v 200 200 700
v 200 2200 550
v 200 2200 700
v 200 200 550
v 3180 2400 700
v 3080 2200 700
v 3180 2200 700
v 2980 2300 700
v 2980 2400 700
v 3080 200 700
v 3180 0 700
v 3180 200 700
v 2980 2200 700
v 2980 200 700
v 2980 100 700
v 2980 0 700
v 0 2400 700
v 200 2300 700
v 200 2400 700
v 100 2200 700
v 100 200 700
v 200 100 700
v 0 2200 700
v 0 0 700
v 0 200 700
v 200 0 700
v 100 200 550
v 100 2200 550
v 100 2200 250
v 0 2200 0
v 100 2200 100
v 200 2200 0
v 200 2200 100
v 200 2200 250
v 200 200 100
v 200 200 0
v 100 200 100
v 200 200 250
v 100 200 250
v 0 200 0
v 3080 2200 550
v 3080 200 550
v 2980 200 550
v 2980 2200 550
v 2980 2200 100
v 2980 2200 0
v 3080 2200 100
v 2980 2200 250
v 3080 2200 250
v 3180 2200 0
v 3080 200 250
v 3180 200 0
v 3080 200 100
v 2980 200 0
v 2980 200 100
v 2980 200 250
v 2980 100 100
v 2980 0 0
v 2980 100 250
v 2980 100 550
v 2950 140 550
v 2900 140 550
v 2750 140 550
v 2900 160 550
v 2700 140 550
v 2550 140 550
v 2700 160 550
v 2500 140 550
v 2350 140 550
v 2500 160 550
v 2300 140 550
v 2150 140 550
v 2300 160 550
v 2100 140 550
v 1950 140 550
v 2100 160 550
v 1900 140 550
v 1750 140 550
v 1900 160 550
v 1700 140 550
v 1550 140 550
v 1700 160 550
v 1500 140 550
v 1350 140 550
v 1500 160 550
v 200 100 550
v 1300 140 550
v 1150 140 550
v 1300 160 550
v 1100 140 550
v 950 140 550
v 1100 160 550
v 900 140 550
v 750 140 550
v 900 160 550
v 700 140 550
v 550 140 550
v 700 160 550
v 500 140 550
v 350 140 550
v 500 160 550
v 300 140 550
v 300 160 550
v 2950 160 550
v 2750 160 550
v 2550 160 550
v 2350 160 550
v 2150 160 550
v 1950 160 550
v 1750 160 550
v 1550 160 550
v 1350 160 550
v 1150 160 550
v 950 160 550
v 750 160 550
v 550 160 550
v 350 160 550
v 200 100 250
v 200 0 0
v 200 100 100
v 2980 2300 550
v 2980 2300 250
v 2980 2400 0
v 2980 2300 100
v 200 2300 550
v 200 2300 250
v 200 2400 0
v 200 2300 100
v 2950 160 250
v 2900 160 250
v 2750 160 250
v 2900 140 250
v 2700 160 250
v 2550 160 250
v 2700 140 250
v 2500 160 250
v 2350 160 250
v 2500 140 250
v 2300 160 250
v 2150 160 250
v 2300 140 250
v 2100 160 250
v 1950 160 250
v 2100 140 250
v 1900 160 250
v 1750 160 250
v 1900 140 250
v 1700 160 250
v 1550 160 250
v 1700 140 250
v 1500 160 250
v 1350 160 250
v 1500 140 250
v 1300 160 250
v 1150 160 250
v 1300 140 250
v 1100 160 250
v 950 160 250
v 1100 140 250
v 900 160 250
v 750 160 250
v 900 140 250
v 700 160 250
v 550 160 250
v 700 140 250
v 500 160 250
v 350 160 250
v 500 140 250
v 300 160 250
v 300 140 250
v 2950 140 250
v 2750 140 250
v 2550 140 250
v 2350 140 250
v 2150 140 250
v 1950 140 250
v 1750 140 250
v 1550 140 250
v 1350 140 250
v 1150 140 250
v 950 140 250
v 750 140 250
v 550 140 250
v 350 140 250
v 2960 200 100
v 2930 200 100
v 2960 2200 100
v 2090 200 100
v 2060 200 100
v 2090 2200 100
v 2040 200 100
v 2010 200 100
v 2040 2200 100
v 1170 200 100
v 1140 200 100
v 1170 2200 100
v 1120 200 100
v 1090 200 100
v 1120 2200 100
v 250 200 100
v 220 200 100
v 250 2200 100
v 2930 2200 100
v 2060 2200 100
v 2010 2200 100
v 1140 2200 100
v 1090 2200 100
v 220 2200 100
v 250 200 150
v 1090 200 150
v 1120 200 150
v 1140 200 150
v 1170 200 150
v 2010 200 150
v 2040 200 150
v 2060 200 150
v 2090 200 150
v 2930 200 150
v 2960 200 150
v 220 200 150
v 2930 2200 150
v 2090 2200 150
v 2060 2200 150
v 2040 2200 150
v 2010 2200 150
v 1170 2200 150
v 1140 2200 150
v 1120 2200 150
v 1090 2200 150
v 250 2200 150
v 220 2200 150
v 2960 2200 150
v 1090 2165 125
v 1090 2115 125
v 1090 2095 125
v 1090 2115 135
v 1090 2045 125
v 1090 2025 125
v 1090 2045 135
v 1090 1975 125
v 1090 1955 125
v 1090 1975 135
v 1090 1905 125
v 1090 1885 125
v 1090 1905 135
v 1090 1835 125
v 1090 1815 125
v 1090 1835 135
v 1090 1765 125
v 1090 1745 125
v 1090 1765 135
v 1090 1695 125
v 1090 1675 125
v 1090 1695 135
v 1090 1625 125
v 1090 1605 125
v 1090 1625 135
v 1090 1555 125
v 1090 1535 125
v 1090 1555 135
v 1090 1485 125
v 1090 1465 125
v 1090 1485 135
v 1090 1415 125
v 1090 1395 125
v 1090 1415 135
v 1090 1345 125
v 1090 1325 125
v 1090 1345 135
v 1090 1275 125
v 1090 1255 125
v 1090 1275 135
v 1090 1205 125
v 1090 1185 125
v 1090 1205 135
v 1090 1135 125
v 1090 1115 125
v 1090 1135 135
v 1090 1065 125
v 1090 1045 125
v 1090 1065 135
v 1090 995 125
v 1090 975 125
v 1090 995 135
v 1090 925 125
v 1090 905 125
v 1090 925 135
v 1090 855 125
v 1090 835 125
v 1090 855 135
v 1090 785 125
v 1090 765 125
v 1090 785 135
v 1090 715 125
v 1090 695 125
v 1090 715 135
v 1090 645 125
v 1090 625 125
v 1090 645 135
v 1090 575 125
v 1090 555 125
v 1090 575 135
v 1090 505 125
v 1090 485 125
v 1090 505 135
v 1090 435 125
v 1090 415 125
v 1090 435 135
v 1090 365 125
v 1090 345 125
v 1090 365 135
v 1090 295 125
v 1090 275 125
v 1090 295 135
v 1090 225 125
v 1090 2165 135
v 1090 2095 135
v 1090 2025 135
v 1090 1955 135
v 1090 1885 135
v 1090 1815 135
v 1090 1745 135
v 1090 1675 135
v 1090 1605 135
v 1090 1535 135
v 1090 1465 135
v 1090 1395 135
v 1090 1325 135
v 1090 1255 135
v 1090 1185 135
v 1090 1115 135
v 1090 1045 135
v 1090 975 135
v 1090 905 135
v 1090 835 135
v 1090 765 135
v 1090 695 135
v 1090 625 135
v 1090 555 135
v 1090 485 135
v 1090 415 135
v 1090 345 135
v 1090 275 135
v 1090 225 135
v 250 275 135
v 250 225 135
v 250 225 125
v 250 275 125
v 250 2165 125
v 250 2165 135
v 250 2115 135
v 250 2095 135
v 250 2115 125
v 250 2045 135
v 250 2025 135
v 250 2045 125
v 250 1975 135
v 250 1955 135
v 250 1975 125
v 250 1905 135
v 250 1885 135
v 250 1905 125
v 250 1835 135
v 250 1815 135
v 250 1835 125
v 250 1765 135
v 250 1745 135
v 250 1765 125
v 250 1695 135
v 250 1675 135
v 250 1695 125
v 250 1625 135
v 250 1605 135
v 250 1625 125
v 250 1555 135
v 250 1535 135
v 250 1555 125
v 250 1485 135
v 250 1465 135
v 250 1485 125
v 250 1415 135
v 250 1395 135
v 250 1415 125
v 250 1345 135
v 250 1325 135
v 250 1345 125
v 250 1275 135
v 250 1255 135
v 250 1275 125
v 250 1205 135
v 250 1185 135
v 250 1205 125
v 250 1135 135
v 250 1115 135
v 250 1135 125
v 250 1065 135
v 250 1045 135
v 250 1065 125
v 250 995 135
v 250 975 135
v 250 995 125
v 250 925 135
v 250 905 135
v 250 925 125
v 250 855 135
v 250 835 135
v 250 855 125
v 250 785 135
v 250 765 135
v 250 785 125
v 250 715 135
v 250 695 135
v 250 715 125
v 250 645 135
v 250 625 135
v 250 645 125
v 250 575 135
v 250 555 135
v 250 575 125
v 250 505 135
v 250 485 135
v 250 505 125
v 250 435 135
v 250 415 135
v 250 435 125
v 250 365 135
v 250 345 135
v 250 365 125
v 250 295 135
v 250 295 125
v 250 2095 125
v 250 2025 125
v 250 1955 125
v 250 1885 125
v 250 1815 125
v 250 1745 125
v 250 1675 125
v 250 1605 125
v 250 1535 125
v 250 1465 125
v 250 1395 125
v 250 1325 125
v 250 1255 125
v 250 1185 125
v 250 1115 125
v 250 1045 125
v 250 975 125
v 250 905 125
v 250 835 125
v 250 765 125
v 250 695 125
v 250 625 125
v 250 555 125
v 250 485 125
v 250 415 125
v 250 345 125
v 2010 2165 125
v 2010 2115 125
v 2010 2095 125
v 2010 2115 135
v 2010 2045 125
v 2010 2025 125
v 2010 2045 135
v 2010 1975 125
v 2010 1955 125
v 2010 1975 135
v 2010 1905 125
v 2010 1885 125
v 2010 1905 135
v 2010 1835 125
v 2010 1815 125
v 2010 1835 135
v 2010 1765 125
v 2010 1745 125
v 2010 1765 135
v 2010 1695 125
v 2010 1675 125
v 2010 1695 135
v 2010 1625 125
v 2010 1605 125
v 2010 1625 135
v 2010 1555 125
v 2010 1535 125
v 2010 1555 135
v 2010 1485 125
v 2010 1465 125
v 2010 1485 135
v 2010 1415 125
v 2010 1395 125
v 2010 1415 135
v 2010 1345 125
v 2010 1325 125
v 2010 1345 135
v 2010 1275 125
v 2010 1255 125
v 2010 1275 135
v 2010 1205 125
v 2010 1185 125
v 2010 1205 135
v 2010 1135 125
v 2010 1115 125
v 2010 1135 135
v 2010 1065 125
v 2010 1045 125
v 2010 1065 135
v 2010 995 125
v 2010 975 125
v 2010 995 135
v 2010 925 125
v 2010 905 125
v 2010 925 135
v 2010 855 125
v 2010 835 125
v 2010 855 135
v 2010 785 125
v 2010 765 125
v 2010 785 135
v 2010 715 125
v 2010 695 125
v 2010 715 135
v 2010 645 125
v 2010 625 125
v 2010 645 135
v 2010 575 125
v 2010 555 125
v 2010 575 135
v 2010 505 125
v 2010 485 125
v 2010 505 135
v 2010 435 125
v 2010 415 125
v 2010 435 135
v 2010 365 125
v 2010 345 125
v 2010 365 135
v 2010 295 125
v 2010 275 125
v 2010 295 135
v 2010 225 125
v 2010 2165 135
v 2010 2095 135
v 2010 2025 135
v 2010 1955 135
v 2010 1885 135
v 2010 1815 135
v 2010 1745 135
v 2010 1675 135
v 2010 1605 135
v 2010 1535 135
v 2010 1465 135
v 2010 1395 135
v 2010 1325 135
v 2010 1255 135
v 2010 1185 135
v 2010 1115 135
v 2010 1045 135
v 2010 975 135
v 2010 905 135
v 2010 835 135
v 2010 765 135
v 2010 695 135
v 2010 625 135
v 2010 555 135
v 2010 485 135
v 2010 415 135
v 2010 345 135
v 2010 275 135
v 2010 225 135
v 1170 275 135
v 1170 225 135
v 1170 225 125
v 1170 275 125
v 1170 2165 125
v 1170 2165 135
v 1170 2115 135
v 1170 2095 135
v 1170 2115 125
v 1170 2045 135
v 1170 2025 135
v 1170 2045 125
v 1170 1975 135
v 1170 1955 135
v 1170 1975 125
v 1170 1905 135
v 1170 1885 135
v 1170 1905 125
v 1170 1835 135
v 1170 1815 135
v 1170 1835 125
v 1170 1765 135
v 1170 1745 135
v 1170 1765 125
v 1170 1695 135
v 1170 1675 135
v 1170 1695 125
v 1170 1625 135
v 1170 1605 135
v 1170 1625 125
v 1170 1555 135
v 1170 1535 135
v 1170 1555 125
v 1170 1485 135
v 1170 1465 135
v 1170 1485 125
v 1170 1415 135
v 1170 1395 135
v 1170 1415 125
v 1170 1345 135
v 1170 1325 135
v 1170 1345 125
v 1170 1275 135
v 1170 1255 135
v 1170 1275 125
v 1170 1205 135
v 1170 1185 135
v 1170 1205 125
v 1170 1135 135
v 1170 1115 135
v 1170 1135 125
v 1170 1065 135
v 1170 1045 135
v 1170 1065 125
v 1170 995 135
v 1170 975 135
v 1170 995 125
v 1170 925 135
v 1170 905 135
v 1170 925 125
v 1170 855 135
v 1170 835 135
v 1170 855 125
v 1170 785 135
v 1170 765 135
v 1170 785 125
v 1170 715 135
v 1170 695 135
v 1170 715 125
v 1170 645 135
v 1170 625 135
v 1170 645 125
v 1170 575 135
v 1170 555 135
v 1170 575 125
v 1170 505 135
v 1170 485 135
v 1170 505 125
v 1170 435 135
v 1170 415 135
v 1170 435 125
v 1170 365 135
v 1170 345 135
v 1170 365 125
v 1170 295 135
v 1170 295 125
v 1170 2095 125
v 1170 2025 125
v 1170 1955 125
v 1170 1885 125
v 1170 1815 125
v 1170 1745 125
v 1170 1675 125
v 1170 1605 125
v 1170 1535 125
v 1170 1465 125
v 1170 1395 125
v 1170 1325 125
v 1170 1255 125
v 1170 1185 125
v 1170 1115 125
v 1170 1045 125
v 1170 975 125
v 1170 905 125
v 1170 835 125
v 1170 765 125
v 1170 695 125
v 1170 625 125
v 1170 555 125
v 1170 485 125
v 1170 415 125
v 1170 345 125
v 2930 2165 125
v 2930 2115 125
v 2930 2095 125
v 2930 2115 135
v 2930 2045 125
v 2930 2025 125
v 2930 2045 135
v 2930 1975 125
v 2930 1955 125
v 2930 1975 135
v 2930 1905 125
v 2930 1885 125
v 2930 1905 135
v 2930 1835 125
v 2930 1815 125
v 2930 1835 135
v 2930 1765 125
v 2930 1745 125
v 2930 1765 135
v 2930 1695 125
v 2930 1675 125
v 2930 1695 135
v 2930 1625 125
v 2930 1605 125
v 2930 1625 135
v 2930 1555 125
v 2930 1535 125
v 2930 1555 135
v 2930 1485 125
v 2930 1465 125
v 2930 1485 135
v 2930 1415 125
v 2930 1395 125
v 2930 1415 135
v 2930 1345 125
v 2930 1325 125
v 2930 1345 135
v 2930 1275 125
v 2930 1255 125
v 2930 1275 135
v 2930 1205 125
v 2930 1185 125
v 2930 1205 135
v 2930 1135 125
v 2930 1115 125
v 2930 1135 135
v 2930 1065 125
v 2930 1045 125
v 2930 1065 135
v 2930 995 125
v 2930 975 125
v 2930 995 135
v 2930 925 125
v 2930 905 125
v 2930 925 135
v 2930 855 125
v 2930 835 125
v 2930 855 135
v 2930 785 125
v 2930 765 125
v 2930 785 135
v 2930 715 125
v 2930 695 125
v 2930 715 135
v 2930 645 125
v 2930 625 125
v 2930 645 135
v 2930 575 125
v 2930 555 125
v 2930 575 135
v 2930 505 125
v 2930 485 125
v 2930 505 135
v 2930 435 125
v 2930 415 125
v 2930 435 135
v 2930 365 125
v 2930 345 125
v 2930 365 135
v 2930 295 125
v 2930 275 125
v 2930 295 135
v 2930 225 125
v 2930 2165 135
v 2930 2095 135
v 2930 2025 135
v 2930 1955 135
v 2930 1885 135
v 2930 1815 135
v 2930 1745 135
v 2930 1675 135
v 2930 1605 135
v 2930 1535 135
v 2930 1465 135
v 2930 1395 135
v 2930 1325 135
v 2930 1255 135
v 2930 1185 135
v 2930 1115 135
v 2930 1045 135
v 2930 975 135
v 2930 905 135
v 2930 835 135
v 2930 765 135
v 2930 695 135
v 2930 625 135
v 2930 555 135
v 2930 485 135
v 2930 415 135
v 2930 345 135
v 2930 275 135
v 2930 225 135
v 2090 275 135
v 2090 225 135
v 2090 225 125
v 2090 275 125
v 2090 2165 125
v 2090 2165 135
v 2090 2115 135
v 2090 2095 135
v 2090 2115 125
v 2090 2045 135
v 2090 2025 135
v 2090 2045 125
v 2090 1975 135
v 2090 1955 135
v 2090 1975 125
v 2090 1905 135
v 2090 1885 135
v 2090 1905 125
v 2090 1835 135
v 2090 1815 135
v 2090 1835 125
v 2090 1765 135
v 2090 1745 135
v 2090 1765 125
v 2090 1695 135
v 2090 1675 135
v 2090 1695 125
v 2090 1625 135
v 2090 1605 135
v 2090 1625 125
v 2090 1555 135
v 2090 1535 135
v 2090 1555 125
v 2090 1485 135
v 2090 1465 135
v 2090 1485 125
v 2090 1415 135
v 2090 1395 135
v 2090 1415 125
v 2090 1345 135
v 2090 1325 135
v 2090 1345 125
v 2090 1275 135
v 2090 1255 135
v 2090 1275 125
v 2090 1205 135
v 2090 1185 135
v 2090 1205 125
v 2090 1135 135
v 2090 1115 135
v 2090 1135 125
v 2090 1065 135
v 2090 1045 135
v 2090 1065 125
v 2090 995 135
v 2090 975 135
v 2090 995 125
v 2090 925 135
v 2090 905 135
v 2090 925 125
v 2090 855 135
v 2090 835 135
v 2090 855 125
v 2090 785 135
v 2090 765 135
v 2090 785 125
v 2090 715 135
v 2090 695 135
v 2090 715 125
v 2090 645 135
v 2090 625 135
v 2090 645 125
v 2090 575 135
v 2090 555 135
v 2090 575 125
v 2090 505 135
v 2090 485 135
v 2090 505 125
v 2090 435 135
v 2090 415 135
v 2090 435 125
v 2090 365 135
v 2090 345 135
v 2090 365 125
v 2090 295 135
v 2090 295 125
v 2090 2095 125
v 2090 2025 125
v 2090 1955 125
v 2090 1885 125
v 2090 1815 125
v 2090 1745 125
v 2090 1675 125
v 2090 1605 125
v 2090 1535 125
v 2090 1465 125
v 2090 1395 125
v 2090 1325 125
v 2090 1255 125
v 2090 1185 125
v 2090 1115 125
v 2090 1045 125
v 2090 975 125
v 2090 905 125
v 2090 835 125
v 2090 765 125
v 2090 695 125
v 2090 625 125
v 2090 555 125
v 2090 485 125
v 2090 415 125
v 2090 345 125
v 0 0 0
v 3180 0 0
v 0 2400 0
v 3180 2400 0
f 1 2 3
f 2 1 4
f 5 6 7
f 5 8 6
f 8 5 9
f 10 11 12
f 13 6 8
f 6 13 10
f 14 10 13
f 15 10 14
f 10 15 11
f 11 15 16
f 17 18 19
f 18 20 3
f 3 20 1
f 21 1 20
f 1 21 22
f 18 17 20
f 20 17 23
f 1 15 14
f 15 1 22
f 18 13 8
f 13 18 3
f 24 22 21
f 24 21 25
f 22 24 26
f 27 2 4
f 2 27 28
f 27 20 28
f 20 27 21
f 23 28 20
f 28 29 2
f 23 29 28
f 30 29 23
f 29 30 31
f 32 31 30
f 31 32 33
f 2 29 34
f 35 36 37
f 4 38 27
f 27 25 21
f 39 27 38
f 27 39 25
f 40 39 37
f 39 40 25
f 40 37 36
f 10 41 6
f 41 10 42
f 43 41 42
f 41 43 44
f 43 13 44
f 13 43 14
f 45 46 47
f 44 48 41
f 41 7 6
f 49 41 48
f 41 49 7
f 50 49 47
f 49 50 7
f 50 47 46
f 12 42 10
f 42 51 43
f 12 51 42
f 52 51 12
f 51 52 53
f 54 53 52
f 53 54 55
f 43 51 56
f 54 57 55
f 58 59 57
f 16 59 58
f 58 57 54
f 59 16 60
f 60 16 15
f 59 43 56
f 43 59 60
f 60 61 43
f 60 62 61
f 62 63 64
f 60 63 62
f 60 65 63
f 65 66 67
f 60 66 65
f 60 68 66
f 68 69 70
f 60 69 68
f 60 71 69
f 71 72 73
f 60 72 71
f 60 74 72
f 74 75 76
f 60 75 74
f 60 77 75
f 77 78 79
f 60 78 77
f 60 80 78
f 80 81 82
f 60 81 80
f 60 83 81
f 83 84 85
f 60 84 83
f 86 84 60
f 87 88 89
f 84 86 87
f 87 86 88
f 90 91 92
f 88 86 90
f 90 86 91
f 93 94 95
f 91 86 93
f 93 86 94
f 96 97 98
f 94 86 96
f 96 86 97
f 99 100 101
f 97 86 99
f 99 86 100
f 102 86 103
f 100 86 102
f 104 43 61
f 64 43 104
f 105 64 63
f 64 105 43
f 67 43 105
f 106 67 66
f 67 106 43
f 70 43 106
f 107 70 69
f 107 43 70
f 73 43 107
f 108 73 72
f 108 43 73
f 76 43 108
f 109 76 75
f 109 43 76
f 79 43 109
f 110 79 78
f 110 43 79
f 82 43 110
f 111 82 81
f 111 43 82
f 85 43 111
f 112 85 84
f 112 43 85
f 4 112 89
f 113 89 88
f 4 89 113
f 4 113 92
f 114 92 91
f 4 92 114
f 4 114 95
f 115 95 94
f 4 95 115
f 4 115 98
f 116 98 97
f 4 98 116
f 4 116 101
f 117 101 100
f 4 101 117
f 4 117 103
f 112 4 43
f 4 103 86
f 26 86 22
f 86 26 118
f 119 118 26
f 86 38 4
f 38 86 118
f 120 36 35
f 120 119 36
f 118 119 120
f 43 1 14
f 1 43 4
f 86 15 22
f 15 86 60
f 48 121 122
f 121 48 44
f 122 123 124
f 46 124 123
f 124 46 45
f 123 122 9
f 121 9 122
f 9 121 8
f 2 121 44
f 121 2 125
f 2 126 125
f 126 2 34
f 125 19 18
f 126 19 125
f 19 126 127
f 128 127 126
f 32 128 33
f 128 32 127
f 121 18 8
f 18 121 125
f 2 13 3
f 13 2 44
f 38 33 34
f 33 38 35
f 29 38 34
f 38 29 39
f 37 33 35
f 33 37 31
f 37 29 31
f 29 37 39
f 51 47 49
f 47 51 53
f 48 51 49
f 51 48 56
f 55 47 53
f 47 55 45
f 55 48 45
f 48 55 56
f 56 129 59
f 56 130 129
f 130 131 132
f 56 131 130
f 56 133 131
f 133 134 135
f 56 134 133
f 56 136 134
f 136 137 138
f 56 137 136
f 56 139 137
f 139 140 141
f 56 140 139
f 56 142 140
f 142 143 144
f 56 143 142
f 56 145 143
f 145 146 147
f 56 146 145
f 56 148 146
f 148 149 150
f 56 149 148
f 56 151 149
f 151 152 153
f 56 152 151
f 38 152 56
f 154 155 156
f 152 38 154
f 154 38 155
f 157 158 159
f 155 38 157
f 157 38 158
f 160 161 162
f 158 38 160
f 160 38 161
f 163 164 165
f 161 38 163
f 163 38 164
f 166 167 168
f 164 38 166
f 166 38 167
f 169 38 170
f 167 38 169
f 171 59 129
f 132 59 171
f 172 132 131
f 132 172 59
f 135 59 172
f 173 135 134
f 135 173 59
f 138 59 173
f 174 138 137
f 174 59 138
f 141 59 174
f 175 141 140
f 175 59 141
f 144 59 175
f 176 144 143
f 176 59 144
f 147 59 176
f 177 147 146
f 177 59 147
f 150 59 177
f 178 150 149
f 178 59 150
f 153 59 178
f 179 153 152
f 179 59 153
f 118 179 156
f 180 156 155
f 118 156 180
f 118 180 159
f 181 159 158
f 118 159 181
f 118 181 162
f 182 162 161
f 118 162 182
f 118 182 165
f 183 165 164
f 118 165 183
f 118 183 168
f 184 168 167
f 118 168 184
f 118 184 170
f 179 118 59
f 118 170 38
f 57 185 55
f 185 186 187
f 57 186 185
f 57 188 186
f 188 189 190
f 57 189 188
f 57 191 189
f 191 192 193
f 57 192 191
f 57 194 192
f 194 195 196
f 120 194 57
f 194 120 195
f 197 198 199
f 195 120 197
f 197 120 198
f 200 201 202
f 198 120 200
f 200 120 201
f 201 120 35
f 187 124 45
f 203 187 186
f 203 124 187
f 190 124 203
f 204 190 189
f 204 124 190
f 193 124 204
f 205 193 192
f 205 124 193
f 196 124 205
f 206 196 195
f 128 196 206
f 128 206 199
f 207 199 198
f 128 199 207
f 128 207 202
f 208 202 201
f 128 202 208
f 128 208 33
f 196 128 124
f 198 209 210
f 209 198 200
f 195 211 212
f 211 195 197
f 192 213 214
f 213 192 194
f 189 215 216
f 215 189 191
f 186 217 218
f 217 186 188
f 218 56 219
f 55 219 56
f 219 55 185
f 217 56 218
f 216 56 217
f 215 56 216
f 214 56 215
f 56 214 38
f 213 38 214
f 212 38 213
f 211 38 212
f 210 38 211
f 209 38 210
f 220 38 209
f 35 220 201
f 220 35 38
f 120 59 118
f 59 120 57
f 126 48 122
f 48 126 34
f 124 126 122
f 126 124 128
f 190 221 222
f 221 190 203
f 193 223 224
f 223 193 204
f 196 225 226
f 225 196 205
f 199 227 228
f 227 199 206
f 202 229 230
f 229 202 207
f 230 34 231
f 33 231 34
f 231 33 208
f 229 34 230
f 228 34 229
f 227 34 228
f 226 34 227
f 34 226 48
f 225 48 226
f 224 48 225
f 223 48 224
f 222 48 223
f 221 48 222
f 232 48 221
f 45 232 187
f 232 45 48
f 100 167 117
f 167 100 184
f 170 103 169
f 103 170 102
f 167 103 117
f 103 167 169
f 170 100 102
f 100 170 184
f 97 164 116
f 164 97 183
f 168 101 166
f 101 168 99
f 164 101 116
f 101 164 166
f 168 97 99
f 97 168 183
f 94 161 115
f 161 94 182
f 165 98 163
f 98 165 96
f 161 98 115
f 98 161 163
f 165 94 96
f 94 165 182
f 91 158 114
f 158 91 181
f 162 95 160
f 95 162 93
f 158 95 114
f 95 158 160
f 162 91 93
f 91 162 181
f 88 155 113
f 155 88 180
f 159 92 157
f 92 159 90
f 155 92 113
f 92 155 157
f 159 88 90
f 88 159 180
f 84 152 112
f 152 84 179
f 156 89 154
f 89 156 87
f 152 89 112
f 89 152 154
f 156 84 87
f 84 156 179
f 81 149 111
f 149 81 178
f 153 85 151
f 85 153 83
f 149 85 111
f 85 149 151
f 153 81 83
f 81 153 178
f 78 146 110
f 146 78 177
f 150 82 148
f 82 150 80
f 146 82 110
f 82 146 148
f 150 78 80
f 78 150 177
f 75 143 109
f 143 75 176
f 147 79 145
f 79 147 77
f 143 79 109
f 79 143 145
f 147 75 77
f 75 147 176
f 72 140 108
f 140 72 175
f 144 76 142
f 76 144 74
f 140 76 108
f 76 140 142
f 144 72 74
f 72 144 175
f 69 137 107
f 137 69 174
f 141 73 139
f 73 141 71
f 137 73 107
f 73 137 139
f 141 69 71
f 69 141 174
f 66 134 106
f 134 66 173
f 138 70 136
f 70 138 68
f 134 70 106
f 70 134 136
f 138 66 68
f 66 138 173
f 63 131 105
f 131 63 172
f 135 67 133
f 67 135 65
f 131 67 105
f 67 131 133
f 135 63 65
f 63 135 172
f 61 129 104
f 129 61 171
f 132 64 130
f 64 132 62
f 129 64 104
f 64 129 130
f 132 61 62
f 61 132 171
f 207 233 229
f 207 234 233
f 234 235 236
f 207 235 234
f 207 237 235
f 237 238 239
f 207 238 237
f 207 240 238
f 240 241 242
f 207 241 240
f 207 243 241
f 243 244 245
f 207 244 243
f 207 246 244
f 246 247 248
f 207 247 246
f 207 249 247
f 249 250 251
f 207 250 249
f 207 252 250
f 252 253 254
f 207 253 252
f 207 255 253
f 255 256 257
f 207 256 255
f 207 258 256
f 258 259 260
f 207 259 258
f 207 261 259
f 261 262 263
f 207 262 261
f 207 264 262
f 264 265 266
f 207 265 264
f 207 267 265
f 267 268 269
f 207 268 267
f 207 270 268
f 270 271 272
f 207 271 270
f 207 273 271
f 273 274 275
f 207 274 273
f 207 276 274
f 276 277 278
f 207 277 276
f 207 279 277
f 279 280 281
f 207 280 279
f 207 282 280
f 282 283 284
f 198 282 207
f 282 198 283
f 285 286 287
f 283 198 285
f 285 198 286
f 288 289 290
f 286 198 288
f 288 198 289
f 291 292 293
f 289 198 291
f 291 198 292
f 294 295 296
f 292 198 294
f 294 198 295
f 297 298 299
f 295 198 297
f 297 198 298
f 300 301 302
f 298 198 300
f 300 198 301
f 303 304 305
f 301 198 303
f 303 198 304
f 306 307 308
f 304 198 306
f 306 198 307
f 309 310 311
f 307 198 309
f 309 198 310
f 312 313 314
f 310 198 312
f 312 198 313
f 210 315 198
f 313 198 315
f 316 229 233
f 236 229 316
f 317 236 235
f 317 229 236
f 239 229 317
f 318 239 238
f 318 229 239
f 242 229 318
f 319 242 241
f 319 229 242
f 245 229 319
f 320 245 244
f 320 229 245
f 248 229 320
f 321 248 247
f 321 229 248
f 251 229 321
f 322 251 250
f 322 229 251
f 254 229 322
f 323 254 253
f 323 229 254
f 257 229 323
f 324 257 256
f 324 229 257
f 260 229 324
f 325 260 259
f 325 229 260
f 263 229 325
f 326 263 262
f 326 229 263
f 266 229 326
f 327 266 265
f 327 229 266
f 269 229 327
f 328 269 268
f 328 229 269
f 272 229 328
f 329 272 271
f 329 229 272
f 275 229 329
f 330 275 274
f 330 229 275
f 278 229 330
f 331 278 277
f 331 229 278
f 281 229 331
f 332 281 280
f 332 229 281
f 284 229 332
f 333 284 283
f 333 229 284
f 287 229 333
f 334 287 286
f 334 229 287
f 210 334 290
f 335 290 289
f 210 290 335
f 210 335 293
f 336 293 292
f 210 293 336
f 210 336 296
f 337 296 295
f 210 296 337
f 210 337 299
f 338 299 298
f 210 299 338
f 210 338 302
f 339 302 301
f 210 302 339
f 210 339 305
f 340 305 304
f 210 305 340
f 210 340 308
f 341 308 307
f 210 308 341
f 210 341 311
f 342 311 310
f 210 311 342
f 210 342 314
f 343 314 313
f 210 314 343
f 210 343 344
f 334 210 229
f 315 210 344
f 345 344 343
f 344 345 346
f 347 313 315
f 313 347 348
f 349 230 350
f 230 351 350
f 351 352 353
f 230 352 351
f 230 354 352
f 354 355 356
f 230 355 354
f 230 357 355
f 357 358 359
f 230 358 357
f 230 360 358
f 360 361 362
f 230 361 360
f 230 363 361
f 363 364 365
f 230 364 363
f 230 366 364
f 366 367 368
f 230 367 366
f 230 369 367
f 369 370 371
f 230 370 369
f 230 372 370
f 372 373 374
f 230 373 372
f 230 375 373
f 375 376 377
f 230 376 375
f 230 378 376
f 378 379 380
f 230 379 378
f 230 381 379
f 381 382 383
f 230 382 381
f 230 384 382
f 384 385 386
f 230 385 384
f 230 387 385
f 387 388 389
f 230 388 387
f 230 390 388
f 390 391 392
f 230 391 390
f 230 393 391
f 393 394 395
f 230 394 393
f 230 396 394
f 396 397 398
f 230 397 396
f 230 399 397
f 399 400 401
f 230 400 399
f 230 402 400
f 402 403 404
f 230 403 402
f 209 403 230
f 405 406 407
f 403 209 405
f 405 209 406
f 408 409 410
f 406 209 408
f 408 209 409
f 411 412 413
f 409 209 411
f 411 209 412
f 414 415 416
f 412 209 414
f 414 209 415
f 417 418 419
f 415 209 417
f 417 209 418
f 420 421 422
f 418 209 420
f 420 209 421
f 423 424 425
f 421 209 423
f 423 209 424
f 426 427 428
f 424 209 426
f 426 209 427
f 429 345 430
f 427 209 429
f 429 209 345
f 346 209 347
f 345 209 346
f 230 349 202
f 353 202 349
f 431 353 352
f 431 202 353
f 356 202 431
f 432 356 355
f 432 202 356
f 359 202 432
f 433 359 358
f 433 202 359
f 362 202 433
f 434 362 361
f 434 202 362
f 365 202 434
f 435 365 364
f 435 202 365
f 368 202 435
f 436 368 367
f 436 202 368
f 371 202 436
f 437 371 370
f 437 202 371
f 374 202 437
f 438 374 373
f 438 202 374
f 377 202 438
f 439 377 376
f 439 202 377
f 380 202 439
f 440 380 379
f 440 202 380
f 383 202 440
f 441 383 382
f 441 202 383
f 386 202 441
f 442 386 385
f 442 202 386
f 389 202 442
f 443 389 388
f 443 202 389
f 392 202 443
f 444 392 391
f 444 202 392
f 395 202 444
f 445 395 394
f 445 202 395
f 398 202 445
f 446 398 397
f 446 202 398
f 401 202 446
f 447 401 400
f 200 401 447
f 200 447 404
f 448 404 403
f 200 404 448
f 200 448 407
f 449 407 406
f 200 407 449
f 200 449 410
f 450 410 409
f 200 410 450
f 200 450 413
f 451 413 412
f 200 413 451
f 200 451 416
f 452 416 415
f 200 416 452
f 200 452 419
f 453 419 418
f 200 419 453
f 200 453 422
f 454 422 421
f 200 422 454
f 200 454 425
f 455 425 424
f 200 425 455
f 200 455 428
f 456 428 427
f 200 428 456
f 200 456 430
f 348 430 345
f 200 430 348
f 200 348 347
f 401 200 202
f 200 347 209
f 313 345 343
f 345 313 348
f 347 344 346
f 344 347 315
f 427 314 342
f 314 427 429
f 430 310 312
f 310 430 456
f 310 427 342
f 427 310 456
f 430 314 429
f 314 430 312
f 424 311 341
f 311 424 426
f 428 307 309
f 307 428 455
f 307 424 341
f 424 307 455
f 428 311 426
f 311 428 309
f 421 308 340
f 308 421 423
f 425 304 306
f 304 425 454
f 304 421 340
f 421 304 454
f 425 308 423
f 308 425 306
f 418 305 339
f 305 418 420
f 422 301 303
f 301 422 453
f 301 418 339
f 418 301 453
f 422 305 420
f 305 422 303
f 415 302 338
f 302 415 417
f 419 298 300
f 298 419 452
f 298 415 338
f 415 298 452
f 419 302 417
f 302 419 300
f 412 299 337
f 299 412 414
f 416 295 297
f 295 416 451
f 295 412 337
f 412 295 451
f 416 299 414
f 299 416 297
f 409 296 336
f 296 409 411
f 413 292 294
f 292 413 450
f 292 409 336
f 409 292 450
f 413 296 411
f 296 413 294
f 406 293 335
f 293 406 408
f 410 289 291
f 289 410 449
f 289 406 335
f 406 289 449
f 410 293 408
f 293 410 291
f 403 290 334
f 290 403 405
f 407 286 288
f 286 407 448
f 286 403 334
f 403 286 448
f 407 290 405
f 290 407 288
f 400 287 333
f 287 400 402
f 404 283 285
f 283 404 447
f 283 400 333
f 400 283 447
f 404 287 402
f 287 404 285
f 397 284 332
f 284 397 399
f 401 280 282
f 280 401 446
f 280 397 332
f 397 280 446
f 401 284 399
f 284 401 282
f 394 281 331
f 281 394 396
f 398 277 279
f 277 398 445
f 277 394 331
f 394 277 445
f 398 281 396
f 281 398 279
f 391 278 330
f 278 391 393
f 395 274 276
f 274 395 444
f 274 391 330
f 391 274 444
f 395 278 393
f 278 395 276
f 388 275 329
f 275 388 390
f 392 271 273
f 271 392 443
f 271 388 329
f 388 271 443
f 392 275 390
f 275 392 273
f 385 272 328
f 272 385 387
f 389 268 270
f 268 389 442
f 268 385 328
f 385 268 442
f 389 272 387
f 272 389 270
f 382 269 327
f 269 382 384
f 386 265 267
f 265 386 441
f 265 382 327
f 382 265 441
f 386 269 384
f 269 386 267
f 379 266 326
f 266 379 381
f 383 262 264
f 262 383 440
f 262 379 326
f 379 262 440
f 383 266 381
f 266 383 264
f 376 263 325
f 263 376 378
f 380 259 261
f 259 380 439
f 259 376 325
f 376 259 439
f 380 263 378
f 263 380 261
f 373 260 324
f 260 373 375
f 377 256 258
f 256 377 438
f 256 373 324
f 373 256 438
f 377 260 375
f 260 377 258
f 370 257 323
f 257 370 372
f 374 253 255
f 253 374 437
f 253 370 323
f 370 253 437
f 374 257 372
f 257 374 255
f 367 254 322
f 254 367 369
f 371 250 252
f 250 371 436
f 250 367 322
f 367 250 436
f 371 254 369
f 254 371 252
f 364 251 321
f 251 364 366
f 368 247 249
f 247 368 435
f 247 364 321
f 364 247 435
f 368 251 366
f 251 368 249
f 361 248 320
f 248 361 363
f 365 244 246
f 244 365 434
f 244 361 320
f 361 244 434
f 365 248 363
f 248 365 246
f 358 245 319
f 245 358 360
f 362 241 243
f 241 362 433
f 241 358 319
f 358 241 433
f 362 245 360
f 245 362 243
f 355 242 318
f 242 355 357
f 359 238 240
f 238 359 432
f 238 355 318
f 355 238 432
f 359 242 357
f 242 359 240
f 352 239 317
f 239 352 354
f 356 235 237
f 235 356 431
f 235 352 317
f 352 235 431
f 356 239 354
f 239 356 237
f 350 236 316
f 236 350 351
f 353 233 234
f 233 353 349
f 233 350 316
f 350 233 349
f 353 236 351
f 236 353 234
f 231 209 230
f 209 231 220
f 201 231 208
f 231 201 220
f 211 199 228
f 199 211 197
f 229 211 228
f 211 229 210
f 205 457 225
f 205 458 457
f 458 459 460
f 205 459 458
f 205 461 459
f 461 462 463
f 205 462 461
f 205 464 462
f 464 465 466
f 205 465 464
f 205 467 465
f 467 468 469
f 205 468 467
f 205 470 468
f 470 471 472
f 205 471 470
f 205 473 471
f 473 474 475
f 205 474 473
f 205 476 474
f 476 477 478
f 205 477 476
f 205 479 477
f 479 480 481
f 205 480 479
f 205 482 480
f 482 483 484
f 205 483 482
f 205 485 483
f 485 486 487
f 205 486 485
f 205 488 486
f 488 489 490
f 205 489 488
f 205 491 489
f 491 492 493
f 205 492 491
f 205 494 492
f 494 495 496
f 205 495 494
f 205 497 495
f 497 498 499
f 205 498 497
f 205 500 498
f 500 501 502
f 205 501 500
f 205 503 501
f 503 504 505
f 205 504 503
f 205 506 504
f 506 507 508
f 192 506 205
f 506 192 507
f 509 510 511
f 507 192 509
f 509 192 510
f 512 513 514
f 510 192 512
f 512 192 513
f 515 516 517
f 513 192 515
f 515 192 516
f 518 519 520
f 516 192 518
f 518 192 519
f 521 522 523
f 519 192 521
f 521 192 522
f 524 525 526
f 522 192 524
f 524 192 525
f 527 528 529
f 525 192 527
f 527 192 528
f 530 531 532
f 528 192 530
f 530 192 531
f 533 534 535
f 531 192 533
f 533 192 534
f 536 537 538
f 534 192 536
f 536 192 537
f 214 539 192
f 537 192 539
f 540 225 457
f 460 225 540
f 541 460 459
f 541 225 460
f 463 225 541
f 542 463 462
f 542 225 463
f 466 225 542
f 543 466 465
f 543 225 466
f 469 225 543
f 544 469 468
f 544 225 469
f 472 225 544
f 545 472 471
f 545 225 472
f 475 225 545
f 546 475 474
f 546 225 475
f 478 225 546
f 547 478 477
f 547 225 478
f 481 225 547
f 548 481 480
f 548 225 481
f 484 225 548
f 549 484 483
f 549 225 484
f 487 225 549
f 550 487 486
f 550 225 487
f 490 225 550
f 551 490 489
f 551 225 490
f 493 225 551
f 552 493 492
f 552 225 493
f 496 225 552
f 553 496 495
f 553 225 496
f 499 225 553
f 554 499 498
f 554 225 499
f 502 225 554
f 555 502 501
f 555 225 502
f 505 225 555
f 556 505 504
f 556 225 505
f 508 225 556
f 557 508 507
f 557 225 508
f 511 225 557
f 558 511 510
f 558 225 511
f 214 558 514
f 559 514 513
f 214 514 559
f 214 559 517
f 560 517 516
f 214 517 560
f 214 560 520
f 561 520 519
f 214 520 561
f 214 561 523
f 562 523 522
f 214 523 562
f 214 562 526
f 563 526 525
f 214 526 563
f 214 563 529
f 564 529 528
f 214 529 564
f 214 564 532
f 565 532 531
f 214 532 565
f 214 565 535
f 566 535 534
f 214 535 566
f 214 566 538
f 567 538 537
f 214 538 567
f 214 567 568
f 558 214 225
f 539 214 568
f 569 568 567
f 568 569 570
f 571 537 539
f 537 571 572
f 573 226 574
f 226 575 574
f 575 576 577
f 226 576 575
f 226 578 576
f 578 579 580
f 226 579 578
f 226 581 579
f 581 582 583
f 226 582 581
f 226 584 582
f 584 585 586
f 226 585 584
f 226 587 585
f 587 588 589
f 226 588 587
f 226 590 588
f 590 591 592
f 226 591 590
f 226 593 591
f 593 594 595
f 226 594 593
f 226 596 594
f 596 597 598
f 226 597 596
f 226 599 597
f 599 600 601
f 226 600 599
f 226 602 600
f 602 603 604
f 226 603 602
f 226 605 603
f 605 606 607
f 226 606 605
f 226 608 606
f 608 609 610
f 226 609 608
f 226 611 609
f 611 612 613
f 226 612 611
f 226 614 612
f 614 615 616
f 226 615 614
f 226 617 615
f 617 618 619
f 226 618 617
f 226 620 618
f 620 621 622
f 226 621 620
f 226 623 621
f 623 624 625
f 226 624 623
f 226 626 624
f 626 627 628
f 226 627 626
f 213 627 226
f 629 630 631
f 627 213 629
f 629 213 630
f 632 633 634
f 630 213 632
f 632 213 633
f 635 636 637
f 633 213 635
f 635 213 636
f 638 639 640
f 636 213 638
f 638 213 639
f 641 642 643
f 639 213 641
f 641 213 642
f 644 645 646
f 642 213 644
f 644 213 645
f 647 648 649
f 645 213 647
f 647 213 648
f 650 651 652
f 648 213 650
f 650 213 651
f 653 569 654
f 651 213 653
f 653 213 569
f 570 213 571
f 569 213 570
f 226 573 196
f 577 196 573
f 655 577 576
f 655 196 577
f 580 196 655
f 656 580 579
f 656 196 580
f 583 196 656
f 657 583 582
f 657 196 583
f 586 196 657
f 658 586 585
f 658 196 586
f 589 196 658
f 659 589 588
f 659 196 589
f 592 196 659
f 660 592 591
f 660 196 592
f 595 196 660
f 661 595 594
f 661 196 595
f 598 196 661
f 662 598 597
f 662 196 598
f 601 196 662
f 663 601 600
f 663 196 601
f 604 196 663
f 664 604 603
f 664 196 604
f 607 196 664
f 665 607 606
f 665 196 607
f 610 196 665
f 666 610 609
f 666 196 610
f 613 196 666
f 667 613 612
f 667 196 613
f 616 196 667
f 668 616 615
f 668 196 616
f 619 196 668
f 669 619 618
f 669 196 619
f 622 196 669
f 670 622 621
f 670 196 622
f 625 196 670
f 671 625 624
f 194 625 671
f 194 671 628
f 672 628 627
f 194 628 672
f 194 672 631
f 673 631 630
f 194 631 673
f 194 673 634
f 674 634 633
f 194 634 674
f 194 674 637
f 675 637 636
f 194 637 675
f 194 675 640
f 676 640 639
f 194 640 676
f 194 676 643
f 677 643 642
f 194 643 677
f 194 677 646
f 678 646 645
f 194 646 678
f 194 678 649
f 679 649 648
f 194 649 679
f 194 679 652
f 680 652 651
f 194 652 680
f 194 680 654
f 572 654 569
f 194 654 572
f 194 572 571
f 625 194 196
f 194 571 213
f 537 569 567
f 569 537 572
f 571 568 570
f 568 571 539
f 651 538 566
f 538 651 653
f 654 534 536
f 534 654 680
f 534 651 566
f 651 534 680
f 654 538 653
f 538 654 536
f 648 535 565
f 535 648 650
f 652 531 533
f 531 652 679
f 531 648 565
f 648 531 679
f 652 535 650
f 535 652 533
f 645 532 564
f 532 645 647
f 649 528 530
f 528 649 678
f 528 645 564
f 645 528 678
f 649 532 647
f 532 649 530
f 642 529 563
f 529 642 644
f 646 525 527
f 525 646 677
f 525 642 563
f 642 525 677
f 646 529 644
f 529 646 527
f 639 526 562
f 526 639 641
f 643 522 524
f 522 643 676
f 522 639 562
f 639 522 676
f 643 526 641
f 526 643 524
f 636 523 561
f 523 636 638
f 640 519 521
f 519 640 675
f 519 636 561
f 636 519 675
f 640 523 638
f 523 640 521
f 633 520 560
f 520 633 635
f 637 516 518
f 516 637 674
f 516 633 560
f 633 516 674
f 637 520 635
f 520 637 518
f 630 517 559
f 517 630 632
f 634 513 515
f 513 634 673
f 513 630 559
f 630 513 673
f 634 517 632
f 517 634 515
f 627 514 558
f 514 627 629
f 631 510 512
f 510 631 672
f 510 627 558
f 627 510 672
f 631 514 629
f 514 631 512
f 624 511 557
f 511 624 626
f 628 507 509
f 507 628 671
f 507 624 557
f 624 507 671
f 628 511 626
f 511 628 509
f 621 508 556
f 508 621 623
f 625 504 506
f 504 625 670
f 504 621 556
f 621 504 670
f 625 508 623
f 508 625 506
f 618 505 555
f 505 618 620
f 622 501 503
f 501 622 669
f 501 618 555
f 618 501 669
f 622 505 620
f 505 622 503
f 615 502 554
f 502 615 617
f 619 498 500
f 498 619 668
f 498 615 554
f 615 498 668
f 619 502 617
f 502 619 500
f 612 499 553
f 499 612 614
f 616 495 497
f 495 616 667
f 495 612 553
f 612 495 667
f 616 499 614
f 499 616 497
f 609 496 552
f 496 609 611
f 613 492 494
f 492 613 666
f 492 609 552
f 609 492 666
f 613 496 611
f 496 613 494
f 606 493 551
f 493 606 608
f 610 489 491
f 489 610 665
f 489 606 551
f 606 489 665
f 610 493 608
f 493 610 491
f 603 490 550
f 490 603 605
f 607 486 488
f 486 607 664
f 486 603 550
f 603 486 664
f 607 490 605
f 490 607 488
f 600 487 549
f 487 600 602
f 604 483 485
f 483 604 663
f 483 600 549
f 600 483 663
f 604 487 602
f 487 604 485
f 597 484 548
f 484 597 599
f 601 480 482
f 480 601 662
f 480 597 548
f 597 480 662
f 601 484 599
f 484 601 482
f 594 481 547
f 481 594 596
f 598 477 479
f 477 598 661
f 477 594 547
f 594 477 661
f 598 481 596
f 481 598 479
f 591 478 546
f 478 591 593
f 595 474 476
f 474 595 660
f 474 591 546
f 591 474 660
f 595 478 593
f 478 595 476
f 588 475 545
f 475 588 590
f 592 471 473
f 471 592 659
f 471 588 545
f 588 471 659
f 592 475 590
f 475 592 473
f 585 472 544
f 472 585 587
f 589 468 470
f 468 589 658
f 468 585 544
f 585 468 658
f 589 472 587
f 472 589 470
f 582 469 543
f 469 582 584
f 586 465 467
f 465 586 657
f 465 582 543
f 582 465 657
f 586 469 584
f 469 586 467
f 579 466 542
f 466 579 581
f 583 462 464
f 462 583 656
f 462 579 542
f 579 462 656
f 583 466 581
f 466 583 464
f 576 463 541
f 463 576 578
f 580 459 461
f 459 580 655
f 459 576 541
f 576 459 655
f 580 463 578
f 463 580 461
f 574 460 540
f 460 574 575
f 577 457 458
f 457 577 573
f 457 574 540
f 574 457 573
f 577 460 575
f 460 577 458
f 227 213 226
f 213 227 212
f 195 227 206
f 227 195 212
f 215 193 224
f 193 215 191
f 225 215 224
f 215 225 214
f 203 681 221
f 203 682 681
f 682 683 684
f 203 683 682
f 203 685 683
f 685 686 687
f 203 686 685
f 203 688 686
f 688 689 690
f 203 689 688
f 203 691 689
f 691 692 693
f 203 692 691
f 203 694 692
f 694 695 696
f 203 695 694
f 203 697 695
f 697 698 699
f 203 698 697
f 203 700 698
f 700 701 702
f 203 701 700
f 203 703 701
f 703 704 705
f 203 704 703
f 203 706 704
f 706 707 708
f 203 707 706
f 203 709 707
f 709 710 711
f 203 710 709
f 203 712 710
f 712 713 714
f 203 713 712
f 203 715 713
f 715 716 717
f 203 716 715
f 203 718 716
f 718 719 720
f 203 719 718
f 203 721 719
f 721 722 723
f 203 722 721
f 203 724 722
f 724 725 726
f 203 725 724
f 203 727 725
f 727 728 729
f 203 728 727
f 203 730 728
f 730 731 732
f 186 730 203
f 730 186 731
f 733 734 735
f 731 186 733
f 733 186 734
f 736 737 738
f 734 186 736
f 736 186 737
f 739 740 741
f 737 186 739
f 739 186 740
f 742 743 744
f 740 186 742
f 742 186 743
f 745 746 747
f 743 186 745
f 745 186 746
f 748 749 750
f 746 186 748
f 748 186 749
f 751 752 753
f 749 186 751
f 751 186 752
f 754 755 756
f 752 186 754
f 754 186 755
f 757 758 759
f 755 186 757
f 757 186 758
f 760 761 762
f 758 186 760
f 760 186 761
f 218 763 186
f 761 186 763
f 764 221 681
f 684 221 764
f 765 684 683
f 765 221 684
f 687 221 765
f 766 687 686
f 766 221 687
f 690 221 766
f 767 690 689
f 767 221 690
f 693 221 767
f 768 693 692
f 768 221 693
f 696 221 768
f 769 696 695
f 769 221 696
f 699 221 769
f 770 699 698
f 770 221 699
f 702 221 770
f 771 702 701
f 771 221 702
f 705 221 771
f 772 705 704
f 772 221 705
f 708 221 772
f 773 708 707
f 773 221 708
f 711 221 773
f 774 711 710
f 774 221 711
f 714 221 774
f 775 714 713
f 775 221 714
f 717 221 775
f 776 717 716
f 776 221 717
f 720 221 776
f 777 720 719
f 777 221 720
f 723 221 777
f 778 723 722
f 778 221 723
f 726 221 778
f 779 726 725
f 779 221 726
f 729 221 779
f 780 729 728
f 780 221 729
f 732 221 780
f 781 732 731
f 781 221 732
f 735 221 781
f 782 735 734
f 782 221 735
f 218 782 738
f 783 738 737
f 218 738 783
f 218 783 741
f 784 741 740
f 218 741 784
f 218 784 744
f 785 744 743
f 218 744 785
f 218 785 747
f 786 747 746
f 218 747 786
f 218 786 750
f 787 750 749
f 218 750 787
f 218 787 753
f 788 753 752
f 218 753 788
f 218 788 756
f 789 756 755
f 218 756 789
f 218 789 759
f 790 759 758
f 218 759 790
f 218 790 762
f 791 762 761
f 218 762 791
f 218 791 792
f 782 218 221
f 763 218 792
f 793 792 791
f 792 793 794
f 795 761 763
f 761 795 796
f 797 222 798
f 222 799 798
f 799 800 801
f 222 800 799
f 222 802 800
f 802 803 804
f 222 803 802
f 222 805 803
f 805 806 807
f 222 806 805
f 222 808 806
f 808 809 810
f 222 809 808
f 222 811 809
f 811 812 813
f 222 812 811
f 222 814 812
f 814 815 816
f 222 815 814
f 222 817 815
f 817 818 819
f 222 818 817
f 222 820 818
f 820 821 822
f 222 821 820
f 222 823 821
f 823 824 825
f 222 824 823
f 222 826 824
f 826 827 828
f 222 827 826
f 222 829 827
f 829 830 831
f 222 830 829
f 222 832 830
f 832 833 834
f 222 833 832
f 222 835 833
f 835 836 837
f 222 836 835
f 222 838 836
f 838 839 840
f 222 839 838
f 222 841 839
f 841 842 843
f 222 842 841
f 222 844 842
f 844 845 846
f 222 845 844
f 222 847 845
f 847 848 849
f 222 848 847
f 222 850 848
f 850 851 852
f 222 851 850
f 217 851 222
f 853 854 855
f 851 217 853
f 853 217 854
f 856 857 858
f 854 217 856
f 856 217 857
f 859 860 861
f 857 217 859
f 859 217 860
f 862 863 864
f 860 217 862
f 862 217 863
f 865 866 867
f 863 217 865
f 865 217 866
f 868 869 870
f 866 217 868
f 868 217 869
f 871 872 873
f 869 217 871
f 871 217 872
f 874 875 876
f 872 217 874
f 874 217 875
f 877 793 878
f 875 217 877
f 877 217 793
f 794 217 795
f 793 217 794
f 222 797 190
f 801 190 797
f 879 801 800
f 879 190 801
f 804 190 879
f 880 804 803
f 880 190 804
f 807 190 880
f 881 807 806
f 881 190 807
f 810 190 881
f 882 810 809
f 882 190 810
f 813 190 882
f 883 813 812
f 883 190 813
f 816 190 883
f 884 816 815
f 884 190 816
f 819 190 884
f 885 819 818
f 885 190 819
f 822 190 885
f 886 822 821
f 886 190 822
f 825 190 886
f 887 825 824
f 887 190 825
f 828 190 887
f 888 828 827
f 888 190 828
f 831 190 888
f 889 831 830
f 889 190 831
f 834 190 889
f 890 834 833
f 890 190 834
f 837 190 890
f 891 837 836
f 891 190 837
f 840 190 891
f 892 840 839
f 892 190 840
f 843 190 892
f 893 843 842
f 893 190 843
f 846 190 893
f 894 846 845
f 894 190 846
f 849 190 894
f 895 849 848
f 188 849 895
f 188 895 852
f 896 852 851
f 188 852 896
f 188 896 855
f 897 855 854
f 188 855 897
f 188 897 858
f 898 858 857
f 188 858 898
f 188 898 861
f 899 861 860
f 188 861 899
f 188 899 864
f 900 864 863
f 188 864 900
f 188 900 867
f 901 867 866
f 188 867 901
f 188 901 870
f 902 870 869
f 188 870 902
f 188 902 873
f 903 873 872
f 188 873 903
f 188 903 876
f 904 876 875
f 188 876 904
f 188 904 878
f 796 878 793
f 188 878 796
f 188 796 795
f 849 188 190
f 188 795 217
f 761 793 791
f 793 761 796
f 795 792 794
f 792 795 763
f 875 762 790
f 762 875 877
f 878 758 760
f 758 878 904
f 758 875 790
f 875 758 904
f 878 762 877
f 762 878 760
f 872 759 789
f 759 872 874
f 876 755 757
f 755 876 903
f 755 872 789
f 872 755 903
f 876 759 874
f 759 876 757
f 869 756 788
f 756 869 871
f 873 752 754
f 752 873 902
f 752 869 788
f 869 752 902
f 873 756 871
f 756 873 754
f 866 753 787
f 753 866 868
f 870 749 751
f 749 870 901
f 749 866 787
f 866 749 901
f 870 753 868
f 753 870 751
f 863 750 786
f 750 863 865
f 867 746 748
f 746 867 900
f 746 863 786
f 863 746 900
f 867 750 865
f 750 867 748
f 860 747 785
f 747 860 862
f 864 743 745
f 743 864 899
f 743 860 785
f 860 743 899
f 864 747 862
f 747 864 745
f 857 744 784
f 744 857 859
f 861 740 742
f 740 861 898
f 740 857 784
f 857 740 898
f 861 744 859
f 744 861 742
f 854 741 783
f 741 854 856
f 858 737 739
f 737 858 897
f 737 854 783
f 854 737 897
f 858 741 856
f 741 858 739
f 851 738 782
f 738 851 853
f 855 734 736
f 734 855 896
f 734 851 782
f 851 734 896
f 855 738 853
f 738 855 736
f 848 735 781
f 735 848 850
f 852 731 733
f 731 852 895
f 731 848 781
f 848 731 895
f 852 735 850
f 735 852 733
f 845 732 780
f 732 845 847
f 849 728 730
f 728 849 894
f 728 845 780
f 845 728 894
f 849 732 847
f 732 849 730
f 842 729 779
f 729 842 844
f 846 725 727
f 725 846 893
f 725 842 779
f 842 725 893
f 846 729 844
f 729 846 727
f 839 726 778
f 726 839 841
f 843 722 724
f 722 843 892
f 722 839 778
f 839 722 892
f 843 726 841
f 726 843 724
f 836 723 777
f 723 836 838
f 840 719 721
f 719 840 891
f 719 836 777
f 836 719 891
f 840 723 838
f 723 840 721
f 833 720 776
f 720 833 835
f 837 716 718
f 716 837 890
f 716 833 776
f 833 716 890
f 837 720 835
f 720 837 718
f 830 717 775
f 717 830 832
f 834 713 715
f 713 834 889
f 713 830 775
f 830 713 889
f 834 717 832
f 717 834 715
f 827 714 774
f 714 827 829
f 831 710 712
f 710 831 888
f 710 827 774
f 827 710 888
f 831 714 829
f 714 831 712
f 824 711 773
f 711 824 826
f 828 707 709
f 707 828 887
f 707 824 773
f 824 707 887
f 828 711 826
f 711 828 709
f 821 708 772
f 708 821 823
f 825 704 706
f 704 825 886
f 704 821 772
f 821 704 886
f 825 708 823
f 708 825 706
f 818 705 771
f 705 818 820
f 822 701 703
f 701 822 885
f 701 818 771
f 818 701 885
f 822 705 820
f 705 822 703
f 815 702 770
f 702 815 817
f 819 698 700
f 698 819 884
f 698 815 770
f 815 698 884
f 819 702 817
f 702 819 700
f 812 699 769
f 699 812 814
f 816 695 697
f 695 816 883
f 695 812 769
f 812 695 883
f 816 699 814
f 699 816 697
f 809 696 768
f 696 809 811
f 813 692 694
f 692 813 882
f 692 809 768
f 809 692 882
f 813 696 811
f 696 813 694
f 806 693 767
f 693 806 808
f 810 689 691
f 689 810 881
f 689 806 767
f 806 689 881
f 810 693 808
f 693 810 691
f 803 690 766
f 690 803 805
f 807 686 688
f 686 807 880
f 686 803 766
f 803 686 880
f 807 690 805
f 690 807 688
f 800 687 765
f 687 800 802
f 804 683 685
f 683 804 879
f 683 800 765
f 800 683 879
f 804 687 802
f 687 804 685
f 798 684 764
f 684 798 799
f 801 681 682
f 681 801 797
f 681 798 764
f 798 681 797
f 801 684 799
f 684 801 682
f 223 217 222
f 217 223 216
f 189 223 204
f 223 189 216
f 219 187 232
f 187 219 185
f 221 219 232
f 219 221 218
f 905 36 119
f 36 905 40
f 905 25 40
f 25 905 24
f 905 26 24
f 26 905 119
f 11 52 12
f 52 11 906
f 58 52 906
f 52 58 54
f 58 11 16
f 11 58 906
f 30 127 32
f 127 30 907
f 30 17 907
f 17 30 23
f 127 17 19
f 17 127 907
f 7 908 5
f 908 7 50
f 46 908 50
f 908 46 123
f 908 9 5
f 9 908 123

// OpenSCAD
pfosten_width = 200;
pfosten_height = 700;

balken_height = 150;
balken_length = 2000;
balken_width = 100;

traeger_width = 300;
traeger_thickness = 100;
traeger_length = 200;

rost_length = 2000;
rost_width = 900;
rost_height = 50;
rost_spacing = 20;
rost_latte_width = 30;
rost_floor_spacing = 100;
latte_width = 50;
latte_thickness = 10;
latte_length = rost_width;
latte_spacing = 20;

balken_length2 = 3 * rost_width + 4 * rost_spacing;
steg_height = pfosten_height - rost_floor_spacing - 2 * balken_height;
steg_width = 50;
steg_thickness = 20;
steg_spacing = 200;

module pfosten() {
  cube([pfosten_width, pfosten_width, pfosten_height]);
}

module rost() {
  cube([rost_latte_width, rost_length, rost_height]);
  translate([rost_width - rost_latte_width, 0, 0]) cube([rost_latte_width, rost_length, rost_height]);
  translate([0, latte_width/2, 0]) for (i = [0:27]) translate([rost_latte_width, i * (latte_width + latte_spacing), rost_height/2]) cube([latte_length - 2 * rost_latte_width, latte_width, latte_thickness]);
}

// Vertikale Pfosten
translate([0, 0, 0]) pfosten();
translate([pfosten_width + rost_spacing + 3 * (rost_width + rost_spacing), 0, 0]) pfosten();
translate([0, rost_length + pfosten_width, 0]) pfosten();
translate([pfosten_width + rost_spacing + 3 * (rost_width + rost_spacing), rost_length + pfosten_width, 0]) pfosten();

// Horizontale Balken oben
translate([0, 0, pfosten_height - balken_height]) {
  translate([pfosten_width - balken_width, pfosten_width, 0]) cube([balken_width, balken_length, balken_height]);
  translate([pfosten_width + 3 * rost_width + 4 * rost_spacing, pfosten_width, 0]) cube([balken_width, balken_length, balken_height]);
  translate([pfosten_width, pfosten_width - balken_width, 0]) cube([balken_length2, balken_width, balken_height]);
  translate([pfosten_width, pfosten_width + rost_length, 0]) cube([balken_length2, balken_width, balken_height]);
}
// Horizontale Balken unten
translate([0, 0, rost_floor_spacing]) {
  translate([pfosten_width - balken_width, pfosten_width, 0]) cube([balken_width, balken_length, balken_height]);
  translate([pfosten_width + 3 * rost_width + 4 * rost_spacing, pfosten_width, 0]) cube([balken_width, balken_length, balken_height]);
  translate([pfosten_width, pfosten_width - balken_width, 0]) cube([balken_length2, balken_width, balken_height]);
  translate([pfosten_width, pfosten_width + rost_length, 0]) cube([balken_length2, balken_width, balken_height]);
}

// Stegs
translate([pfosten_width + steg_spacing / 2, pfosten_width - balken_width / 2 - steg_thickness / 2, rost_floor_spacing + balken_height])
  for (i = [0:13]) translate([i * steg_spacing, 0, 0]) cube([steg_width, steg_thickness, steg_height]);

// 3 Rost nebeneinander mit Abstand
translate([pfosten_width + rost_spacing, pfosten_width, rost_floor_spacing]) {
  for (i = [0:2]) translate([i * (rost_width + rost_spacing), 0, 0]) rost();
}

/*
// 180cm Matratze + 90cm Matratze
translate([pfosten_width + rost_spacing, pfosten_width, rost_floor_spacing + rost_height + rost_spacing]) {
  cube([2 * rost_width + rost_spacing, rost_length, 200]); // 180cm Matratze
  translate([2 * rost_width + 2 * rost_spacing, 0, 0]) cube([rost_width, rost_length, 200]); // 90cm Matratze
}
*/
